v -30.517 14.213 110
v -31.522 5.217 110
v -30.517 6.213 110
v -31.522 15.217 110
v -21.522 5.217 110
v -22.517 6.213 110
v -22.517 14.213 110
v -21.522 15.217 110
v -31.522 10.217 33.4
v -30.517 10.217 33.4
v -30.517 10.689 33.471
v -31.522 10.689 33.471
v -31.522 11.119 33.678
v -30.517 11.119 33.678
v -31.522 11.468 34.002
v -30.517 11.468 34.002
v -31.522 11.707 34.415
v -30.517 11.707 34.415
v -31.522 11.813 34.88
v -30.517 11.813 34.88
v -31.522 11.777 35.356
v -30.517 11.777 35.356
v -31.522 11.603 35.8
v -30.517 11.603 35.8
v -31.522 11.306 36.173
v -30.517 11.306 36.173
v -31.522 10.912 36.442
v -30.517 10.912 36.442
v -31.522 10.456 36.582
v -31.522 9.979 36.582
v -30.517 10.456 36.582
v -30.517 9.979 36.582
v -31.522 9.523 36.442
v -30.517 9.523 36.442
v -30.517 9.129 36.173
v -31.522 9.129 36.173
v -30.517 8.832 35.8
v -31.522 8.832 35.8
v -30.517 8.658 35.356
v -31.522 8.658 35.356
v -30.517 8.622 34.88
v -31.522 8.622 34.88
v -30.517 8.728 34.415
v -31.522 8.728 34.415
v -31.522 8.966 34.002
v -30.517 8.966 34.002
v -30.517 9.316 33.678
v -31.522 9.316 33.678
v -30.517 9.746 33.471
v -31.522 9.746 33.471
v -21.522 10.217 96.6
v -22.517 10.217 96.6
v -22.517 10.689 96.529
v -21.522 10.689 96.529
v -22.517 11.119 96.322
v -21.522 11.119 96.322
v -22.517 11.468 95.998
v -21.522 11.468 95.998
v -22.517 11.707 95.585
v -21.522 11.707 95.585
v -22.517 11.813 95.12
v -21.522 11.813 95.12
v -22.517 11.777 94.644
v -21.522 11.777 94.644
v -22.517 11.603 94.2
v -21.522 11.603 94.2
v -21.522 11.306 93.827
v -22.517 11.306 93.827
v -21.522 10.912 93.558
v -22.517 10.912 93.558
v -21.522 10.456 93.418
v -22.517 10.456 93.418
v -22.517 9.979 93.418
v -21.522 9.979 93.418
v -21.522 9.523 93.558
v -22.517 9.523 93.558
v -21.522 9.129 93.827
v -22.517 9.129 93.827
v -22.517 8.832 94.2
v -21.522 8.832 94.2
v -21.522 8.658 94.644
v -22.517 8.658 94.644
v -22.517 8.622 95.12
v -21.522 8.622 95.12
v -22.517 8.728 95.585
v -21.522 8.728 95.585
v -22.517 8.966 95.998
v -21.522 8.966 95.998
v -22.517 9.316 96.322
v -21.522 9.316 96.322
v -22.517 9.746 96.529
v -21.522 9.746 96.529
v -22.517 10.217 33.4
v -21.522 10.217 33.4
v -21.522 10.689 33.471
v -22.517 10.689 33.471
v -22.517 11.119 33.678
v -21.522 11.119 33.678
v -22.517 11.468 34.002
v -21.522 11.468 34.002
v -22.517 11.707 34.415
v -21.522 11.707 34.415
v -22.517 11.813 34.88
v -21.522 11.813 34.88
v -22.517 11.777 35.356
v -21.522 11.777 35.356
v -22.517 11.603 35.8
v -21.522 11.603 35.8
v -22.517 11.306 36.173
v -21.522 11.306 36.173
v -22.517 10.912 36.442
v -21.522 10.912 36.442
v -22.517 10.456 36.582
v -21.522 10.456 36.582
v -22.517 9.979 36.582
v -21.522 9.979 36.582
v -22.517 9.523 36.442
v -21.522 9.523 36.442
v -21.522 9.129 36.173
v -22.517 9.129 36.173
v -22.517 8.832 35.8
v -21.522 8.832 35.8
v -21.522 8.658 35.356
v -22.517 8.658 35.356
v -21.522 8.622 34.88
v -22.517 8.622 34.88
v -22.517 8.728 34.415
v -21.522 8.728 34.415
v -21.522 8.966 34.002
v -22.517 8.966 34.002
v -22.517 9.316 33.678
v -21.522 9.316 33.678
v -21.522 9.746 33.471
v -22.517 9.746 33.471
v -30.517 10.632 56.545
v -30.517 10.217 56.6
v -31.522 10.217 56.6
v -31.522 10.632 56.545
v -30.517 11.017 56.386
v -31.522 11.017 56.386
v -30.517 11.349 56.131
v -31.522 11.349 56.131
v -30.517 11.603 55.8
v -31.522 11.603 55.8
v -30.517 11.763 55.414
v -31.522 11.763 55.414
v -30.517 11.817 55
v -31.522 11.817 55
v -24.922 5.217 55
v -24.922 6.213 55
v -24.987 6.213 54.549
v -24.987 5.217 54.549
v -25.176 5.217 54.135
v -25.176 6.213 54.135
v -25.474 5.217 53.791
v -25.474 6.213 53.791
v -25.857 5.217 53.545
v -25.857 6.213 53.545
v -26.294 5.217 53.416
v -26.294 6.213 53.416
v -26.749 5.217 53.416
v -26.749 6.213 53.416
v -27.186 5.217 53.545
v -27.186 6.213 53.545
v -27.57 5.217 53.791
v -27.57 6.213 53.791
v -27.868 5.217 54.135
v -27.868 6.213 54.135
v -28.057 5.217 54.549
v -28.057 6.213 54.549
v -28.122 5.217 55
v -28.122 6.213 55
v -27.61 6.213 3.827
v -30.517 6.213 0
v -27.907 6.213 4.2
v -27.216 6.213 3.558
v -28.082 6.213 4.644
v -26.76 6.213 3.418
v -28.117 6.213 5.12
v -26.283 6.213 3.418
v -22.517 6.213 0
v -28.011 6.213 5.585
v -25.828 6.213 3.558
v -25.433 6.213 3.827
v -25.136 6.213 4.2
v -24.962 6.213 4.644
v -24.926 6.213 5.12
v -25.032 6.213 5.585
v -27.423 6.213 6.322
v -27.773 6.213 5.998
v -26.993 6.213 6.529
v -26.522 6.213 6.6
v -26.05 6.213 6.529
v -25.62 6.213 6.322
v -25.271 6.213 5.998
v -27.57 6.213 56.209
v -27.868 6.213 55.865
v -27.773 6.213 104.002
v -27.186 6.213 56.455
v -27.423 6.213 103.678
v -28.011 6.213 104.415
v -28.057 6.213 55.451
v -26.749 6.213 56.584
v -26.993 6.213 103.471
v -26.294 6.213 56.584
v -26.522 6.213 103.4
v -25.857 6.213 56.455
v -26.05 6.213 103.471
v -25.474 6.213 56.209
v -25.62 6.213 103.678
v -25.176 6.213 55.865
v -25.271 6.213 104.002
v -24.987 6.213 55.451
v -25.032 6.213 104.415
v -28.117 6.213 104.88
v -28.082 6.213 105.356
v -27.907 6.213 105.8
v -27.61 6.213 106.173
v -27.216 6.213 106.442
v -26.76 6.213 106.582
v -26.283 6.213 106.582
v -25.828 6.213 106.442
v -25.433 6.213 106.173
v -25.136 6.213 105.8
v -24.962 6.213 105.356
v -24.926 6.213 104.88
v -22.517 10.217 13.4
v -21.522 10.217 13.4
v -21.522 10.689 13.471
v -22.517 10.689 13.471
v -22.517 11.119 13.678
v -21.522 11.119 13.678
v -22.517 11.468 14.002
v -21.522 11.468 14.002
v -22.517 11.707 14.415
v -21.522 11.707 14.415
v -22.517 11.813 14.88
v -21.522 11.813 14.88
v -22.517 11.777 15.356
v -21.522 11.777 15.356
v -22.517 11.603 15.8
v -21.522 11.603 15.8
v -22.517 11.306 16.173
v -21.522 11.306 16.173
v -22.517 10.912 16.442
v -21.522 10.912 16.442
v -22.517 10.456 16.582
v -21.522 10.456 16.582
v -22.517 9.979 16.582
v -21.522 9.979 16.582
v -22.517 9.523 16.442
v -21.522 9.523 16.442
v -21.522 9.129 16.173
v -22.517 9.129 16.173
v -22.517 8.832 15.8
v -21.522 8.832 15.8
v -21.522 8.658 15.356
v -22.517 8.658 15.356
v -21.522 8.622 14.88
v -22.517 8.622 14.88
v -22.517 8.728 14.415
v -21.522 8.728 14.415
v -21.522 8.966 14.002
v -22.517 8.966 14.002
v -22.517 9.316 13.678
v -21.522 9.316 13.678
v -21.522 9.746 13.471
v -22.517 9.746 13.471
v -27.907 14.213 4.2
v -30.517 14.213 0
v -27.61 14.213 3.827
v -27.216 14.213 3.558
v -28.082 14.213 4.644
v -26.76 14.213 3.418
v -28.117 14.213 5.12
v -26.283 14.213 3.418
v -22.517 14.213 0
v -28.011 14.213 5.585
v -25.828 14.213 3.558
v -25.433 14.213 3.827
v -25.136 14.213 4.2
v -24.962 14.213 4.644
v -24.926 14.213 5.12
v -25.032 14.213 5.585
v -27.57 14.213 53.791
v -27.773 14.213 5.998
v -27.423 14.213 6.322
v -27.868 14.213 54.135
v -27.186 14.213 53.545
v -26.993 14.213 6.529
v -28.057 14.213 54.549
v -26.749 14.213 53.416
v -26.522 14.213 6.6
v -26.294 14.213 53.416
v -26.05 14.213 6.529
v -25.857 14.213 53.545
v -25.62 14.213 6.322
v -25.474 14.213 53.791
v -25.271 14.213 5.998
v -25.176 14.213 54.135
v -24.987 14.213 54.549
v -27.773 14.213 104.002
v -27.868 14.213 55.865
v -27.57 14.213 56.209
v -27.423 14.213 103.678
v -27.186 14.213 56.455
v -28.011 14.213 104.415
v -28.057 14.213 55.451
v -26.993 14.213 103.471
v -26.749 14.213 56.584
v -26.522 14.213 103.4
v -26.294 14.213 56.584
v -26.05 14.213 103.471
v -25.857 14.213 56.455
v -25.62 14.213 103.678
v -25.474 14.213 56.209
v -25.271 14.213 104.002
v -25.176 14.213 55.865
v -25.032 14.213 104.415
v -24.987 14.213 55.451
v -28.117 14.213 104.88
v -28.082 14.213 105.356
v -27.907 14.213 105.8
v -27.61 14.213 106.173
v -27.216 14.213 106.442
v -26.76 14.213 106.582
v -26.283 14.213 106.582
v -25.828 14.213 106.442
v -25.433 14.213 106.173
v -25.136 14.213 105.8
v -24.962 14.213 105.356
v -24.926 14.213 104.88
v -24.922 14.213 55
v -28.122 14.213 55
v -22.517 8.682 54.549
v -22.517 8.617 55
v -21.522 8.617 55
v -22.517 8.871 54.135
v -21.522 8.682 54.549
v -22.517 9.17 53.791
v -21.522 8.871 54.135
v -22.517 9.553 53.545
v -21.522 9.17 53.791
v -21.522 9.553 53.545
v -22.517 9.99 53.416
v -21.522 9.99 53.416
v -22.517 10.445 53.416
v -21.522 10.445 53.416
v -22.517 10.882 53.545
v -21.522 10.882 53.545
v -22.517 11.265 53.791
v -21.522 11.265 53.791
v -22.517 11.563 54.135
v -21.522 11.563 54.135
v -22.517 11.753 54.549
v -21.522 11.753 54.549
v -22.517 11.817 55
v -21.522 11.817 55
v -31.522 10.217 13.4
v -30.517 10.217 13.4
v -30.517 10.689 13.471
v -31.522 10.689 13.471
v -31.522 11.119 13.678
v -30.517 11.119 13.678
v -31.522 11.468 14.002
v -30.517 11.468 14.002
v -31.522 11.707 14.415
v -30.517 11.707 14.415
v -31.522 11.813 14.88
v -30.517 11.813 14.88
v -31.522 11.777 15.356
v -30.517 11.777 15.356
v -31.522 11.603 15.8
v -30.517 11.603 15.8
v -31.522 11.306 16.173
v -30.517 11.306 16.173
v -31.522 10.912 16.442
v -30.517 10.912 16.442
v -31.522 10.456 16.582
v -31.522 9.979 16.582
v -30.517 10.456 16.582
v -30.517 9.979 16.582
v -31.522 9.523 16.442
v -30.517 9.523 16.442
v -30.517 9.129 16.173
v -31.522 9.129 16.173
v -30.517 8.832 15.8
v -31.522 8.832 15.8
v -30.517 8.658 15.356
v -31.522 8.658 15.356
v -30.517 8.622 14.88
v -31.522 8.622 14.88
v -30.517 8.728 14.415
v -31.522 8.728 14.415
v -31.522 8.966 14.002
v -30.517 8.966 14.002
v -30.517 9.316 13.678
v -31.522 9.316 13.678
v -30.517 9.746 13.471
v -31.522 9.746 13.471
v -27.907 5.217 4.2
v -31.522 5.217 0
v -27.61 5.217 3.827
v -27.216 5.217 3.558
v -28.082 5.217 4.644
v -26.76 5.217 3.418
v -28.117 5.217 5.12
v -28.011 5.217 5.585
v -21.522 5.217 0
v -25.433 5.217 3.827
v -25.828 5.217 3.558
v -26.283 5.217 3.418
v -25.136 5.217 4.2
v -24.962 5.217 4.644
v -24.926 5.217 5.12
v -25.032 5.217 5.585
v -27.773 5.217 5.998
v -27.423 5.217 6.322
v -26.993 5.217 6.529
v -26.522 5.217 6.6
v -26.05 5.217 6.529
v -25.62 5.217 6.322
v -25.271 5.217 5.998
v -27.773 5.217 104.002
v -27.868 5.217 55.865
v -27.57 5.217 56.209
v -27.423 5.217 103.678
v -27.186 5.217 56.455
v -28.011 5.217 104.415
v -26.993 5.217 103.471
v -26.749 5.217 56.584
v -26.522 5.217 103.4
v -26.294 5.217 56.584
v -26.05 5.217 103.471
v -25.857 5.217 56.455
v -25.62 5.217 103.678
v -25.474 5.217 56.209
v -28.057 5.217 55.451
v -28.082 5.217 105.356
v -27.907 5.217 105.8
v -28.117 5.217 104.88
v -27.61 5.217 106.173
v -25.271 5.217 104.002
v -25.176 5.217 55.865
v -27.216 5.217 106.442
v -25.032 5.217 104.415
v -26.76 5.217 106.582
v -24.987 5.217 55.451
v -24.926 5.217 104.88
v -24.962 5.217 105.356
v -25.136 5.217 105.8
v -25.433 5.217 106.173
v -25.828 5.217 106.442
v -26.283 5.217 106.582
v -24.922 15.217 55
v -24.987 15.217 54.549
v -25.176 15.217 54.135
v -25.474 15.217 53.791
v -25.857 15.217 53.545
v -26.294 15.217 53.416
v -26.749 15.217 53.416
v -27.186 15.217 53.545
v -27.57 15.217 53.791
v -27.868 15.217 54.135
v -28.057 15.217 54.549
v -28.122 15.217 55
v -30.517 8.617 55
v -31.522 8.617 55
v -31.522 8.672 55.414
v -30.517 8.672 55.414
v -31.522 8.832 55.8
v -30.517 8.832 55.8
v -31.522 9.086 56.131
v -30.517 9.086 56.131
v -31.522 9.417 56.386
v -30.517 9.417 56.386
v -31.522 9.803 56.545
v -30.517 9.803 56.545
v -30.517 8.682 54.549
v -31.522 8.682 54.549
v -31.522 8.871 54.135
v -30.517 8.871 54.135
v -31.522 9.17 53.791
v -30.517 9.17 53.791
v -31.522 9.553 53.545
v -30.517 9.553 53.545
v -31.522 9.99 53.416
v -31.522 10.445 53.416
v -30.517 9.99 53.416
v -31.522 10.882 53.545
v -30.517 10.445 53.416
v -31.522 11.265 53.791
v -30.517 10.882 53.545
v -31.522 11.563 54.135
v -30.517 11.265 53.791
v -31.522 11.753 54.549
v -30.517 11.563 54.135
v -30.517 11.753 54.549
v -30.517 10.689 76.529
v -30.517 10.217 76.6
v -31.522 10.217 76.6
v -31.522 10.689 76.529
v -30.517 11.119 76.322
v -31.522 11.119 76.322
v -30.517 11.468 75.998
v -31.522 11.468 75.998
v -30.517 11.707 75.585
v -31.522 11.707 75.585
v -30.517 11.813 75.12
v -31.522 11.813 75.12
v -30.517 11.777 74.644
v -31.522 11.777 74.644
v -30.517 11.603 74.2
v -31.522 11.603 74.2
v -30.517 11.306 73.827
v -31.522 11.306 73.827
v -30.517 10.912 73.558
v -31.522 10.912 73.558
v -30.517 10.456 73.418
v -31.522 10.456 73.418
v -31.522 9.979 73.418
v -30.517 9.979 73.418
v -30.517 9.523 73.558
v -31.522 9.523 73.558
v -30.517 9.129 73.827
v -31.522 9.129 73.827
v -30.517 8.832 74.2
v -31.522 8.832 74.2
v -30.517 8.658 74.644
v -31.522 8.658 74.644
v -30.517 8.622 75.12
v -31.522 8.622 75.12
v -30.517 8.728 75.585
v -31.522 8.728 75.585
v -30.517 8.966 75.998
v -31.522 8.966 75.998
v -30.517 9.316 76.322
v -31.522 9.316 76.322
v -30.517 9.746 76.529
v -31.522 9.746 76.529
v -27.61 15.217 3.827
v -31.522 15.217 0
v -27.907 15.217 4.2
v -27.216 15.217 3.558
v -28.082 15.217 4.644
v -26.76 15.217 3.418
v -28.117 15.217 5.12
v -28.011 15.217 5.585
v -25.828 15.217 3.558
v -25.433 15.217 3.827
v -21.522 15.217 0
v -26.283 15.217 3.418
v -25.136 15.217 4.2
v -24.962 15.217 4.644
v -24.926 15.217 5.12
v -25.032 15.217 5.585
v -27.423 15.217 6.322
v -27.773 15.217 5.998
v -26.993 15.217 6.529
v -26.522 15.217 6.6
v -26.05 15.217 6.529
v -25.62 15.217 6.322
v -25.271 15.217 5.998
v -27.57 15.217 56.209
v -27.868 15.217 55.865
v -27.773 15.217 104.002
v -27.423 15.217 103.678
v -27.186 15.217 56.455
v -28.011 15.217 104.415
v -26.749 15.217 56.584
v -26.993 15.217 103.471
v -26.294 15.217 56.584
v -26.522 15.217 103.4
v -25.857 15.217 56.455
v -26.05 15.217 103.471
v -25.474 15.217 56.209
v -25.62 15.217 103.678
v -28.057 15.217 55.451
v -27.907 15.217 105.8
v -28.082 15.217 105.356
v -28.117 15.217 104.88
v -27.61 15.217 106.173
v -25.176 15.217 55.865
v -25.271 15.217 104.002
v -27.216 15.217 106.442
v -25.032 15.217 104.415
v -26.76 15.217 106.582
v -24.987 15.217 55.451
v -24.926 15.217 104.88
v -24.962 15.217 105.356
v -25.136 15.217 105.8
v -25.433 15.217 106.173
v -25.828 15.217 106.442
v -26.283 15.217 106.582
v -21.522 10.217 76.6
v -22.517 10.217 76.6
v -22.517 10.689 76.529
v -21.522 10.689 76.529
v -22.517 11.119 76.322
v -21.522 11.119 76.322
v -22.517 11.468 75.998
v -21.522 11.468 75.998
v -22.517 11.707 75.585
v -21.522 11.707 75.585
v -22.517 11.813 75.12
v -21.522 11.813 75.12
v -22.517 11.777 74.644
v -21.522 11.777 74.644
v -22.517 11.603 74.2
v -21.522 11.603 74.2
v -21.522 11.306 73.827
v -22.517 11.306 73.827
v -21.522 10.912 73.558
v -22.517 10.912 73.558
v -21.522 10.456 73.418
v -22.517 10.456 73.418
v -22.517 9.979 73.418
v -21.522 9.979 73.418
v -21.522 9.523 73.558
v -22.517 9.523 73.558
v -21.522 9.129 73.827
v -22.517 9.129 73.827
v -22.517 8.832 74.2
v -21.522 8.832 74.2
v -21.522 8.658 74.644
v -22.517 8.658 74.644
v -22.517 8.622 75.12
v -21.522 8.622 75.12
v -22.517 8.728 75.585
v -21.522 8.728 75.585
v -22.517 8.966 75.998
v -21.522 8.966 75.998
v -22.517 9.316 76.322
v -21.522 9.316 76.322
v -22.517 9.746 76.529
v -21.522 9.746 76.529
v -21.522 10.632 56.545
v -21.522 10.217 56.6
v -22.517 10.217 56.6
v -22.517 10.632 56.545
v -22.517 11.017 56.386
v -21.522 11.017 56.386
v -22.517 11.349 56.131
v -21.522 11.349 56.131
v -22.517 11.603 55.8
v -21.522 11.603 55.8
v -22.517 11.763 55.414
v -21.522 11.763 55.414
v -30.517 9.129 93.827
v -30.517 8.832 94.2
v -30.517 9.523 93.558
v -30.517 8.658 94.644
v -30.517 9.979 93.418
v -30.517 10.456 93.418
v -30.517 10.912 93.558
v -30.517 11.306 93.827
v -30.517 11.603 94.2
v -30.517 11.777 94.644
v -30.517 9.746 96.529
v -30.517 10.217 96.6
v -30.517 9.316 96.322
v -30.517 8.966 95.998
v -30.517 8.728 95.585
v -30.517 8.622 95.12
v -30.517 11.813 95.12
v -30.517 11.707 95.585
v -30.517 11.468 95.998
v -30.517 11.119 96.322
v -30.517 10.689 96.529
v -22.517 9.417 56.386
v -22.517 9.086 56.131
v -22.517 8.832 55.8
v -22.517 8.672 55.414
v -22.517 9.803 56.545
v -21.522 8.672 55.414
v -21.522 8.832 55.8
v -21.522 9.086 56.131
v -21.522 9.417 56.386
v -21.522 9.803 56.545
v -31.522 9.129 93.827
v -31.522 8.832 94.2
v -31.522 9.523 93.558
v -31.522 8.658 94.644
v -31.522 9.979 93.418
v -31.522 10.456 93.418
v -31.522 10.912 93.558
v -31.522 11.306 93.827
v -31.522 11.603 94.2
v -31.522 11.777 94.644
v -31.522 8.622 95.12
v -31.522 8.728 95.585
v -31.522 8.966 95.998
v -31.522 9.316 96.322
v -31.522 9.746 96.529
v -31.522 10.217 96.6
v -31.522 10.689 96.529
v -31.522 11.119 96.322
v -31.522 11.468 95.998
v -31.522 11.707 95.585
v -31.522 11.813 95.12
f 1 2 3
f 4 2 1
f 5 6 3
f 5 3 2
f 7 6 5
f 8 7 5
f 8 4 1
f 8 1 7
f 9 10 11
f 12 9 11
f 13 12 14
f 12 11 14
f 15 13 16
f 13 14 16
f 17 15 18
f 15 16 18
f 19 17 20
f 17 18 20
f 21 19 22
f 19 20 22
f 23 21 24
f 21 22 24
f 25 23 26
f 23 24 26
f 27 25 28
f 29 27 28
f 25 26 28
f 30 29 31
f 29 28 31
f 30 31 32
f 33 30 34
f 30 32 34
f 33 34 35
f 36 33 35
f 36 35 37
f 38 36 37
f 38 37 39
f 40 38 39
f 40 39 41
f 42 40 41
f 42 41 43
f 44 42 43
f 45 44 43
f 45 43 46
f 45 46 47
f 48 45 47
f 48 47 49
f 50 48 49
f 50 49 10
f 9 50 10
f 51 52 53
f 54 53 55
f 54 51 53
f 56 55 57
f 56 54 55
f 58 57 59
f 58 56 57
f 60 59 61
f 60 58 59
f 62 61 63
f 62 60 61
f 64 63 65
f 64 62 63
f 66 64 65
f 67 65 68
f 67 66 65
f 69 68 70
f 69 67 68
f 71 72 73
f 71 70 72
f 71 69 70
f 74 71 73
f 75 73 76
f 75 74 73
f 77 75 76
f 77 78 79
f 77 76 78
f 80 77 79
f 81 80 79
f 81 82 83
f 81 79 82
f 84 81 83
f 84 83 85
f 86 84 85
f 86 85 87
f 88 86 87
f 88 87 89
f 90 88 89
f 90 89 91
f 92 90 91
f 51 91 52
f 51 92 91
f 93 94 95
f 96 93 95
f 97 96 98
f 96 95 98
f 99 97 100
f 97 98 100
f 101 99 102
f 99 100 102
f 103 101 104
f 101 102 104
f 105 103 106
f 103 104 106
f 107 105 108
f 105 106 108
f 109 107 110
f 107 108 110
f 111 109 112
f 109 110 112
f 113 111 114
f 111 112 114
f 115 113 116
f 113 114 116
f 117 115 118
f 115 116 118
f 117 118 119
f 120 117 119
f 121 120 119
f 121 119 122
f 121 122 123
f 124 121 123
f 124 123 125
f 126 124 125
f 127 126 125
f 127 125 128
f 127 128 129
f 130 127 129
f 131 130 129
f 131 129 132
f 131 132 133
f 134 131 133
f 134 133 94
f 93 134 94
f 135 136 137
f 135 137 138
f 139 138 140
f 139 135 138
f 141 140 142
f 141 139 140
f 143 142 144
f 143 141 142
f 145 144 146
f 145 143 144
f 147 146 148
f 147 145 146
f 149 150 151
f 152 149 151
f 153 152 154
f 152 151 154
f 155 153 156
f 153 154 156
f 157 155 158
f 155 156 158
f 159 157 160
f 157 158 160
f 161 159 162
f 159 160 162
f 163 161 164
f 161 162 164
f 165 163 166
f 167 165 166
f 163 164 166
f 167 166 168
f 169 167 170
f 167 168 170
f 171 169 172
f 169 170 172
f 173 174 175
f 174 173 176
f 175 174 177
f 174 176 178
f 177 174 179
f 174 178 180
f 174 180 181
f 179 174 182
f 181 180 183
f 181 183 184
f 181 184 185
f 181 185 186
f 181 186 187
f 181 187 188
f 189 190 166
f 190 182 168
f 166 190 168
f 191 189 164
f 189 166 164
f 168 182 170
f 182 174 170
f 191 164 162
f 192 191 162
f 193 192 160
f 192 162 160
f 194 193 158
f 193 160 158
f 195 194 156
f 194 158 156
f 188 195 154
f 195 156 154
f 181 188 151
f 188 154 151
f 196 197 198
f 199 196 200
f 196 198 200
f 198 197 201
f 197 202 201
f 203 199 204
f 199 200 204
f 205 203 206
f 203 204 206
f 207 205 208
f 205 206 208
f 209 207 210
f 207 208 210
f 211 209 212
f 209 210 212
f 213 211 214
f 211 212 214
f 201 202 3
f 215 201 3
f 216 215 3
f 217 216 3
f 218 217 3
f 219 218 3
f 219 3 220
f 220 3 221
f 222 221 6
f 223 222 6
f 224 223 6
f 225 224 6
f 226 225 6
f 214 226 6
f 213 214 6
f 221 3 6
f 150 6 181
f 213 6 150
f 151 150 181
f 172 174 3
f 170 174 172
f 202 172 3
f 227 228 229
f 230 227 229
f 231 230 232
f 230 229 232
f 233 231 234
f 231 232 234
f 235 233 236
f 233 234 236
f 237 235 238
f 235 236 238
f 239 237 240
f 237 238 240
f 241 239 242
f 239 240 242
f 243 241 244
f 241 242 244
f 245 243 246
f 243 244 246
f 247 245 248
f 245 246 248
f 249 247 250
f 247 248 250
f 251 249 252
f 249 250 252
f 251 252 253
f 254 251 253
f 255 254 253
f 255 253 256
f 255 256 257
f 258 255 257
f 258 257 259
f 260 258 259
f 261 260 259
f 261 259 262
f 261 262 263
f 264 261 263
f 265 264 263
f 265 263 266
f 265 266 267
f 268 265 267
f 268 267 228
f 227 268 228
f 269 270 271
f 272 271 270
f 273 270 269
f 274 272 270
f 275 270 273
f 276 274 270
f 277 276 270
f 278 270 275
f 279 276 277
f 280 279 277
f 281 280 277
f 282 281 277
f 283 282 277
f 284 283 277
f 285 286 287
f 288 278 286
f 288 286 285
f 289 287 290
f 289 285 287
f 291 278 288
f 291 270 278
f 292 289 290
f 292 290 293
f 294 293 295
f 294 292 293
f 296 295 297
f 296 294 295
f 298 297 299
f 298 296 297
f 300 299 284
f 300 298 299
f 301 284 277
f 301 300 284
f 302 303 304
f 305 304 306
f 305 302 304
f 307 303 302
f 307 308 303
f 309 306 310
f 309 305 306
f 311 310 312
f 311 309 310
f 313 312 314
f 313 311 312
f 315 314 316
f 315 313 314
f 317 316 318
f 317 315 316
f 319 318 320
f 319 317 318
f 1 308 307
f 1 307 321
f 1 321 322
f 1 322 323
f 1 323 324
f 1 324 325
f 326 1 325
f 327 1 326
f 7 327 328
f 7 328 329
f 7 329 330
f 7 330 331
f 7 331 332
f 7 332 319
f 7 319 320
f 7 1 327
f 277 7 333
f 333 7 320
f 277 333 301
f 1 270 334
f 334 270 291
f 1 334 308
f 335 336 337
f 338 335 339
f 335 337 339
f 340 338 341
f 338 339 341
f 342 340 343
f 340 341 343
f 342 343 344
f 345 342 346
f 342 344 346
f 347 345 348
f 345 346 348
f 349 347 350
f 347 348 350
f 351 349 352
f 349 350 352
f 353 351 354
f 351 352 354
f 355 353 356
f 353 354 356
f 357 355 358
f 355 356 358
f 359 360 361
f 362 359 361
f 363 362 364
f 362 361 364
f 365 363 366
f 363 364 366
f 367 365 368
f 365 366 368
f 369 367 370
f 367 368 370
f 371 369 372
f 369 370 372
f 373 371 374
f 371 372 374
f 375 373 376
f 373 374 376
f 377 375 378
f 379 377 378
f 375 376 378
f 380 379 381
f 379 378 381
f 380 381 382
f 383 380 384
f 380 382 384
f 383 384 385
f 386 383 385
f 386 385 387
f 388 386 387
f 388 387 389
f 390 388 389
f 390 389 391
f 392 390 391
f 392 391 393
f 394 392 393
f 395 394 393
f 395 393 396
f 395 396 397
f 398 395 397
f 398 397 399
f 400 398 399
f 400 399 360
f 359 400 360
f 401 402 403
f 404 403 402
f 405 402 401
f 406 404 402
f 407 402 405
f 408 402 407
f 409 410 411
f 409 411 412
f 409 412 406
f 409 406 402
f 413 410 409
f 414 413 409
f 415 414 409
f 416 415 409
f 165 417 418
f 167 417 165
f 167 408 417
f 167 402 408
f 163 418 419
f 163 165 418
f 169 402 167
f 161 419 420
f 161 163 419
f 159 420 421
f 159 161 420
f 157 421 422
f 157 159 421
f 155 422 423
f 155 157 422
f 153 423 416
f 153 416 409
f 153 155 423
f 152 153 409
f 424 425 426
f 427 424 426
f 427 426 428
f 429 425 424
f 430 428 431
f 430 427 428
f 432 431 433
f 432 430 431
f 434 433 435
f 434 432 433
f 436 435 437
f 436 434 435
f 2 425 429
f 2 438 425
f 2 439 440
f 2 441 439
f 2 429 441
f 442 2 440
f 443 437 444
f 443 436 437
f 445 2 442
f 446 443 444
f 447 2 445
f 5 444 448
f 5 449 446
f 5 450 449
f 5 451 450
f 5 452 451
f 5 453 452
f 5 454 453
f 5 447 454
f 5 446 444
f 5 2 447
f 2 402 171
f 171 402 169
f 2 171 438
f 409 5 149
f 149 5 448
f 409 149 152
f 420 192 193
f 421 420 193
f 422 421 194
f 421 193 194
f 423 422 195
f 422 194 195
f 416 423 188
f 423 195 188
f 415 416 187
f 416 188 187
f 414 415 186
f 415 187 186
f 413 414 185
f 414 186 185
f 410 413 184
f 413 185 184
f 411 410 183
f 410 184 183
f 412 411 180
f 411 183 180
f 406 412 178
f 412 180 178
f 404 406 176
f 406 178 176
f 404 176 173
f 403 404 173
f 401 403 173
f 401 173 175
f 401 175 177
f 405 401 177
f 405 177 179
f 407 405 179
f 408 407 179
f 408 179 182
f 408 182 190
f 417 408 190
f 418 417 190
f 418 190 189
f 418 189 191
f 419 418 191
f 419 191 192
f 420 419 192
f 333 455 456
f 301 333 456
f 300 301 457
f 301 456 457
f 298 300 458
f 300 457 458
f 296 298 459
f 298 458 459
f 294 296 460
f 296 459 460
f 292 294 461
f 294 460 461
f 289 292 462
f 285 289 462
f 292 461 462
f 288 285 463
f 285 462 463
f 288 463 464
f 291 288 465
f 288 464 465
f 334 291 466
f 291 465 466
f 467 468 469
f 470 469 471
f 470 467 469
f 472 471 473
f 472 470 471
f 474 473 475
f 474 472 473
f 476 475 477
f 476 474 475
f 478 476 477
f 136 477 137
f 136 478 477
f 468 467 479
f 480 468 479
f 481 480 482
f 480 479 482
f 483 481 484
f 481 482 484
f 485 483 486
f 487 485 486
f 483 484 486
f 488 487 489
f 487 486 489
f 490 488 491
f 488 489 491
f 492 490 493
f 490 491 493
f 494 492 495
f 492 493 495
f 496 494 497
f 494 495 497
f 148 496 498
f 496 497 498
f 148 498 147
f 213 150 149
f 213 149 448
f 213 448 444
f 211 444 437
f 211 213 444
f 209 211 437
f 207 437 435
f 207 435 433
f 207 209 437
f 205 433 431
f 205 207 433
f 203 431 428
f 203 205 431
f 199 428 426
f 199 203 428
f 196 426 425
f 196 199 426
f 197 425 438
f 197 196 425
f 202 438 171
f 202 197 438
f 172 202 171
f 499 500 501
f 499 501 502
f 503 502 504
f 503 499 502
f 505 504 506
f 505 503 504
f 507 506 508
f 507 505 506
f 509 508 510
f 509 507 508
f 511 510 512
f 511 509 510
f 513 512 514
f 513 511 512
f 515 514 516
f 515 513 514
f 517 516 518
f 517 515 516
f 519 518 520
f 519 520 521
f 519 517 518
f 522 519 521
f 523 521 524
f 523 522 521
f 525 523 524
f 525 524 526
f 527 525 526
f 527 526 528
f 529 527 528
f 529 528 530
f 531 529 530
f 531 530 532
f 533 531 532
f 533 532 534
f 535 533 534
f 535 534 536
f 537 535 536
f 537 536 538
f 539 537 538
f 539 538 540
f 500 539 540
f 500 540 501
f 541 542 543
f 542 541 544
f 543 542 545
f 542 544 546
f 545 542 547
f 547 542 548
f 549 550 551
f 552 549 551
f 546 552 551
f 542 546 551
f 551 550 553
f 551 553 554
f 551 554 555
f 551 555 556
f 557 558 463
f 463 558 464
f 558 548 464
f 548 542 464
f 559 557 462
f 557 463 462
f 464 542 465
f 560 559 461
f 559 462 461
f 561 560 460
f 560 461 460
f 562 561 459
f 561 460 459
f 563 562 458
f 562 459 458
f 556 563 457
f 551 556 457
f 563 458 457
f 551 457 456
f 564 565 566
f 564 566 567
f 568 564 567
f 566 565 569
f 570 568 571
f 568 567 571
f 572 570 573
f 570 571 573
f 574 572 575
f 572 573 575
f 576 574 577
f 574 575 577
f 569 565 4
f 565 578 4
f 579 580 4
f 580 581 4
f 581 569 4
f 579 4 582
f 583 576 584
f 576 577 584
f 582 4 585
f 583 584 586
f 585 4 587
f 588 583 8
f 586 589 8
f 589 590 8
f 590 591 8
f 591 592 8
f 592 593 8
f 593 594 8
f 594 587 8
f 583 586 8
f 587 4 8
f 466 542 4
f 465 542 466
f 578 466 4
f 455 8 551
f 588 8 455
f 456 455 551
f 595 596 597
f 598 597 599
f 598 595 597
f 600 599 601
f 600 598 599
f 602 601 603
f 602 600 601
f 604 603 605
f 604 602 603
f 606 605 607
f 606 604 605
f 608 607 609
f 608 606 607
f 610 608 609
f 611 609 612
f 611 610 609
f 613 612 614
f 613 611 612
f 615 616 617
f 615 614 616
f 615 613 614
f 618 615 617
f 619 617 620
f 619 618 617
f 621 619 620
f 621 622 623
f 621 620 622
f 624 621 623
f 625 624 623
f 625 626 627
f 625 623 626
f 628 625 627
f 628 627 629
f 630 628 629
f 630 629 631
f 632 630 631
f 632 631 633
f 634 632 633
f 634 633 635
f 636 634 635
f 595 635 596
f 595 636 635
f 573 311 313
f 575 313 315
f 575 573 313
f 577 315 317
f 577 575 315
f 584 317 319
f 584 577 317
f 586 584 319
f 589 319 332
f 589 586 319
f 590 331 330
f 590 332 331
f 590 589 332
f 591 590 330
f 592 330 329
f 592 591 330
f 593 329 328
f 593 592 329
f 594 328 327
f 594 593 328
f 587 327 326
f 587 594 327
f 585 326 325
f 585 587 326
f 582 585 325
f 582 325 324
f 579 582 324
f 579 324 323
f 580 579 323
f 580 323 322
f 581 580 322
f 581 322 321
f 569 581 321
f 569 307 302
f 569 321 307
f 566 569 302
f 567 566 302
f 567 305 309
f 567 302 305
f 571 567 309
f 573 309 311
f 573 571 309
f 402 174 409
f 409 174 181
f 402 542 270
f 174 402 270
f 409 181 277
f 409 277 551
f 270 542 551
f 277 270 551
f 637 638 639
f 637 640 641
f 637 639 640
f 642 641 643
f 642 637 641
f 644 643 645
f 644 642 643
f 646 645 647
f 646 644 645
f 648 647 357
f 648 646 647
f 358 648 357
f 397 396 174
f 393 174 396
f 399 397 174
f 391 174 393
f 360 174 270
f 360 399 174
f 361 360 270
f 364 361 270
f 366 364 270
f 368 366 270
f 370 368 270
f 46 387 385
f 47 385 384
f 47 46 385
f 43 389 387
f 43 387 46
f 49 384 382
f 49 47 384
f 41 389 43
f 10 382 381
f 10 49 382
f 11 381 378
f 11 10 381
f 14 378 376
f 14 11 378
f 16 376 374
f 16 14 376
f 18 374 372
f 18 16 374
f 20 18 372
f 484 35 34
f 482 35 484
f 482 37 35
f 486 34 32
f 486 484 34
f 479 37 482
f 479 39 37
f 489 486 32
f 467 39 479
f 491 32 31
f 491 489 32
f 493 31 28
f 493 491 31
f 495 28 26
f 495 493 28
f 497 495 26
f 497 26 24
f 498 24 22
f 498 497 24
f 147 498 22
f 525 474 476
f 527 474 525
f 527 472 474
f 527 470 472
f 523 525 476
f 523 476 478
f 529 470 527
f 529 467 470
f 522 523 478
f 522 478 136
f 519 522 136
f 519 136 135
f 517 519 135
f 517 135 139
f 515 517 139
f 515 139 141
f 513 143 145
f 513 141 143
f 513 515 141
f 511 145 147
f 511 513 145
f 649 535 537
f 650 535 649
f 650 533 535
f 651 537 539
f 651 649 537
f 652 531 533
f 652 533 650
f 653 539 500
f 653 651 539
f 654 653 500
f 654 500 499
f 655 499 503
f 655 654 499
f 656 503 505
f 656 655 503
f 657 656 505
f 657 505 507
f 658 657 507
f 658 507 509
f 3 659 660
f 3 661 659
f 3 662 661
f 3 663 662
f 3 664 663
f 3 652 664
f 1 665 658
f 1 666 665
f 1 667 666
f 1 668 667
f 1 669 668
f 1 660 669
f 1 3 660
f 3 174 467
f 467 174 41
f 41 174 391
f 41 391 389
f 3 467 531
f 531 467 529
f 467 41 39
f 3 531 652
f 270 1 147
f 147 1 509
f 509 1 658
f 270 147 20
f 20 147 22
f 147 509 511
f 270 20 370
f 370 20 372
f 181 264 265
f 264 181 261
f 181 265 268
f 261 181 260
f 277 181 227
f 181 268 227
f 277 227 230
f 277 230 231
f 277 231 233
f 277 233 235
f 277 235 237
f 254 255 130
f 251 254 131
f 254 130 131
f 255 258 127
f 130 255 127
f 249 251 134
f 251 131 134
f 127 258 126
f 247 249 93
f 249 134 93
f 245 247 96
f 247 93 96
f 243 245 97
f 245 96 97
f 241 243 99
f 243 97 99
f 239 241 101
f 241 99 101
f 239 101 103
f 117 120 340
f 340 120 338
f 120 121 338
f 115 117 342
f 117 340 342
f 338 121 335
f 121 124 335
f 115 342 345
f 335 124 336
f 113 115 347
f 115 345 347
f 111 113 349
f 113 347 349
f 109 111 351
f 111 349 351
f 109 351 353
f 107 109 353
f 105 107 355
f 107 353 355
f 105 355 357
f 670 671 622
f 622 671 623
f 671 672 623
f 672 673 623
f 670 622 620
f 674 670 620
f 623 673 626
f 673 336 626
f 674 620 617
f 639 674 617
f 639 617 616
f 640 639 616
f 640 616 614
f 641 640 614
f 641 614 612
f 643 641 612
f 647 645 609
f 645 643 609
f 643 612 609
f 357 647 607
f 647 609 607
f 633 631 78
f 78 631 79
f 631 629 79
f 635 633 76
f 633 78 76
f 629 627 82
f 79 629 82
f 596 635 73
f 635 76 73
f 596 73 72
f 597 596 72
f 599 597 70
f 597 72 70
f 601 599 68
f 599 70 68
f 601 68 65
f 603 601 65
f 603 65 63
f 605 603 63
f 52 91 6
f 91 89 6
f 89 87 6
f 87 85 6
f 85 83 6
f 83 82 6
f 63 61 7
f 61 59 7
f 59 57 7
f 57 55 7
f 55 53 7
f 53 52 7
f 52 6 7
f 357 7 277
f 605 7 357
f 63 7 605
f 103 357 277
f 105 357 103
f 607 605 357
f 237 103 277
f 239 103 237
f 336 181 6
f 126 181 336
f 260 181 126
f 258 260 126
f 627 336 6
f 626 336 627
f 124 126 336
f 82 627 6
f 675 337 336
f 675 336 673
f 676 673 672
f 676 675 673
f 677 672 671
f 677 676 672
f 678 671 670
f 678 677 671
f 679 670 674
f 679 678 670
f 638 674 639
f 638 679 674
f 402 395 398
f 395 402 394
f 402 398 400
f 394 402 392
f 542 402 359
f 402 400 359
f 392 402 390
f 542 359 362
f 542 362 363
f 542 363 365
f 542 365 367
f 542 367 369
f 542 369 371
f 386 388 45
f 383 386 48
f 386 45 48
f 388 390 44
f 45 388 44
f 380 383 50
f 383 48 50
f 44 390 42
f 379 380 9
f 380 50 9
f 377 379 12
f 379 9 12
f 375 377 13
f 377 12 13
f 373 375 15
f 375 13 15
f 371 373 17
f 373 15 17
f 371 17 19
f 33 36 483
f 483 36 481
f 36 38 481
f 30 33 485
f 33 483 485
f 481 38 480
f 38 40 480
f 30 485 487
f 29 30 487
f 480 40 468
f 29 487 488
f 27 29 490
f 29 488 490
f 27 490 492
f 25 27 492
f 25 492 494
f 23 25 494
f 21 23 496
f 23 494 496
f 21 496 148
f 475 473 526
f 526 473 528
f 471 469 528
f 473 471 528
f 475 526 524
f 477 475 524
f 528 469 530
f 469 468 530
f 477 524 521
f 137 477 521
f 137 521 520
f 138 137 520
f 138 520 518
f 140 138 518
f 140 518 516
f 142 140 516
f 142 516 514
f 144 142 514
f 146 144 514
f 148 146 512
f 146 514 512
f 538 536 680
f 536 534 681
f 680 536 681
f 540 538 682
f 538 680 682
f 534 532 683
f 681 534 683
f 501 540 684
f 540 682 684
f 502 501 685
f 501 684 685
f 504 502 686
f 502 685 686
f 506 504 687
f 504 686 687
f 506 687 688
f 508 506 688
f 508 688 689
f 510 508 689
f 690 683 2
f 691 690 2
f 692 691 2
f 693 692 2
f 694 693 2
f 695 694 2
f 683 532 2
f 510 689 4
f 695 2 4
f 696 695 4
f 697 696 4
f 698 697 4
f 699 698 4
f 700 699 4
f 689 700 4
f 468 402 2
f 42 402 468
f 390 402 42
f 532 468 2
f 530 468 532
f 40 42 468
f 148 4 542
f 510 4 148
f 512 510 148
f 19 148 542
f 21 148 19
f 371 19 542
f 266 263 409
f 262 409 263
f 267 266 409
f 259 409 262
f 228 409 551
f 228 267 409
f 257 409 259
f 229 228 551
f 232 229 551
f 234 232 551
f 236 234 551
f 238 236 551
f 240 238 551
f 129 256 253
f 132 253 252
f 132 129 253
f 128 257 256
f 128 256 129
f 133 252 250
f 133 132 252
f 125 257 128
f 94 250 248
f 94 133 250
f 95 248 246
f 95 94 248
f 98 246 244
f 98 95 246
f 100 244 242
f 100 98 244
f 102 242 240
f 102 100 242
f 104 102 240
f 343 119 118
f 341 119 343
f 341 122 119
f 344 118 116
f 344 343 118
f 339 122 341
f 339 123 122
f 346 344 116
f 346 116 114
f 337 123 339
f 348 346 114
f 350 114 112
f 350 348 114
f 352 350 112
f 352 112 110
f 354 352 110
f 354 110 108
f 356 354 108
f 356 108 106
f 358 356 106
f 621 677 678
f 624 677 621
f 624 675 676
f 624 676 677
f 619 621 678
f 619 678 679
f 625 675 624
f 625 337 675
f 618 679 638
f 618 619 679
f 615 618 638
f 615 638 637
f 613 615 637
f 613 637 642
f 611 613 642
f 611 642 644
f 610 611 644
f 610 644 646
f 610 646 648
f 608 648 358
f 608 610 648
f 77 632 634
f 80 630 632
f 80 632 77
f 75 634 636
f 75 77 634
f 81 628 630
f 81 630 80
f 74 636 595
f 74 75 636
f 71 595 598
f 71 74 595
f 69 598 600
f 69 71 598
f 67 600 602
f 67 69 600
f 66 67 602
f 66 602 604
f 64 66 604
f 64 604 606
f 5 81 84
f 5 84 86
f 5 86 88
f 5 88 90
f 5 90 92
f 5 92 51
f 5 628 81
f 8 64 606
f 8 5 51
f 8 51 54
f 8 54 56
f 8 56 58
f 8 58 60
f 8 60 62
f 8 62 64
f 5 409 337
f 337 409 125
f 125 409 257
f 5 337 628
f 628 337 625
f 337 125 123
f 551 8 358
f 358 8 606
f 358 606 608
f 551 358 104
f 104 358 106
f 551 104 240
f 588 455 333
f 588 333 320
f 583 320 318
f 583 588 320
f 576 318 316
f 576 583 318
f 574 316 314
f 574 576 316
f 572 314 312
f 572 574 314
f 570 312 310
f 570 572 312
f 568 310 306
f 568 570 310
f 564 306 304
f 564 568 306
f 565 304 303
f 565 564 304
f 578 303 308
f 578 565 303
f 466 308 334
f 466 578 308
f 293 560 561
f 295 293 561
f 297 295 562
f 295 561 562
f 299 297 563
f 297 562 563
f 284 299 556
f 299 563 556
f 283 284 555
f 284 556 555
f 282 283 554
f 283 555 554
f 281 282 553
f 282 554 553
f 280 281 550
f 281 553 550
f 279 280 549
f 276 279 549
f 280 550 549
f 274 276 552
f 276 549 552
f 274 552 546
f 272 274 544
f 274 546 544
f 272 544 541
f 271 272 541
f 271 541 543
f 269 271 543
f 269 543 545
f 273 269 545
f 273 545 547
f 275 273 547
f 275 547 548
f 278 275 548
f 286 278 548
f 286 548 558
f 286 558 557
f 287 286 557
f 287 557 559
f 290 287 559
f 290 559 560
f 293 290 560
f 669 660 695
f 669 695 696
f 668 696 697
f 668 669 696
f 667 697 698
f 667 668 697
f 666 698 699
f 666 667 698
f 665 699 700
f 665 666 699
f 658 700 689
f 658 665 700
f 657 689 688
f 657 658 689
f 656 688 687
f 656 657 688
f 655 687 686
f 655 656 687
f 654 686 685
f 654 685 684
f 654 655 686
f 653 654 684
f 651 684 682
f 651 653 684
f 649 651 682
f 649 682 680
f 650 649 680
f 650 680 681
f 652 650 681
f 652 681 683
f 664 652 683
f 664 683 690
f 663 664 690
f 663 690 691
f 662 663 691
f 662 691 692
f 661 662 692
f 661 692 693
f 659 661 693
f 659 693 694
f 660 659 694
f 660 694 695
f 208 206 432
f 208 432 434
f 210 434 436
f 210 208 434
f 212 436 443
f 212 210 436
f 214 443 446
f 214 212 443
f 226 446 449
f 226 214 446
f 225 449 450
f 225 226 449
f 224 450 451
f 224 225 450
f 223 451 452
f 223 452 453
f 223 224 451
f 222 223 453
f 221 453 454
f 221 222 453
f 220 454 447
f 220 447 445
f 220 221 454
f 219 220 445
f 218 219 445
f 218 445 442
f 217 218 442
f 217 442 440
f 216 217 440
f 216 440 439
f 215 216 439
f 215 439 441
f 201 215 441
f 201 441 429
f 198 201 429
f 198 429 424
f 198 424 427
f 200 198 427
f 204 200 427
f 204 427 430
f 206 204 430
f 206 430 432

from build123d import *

# Parameters (mm, degrees)
SKETCH1_W           = 10
SKETCH1_H           = 10
BOSS_EXTRUDE1_DEPTH = 55
SKETCH2_W           = 8
SKETCH2_H           = 8
CUT_EXTRUDE1_DEPTH  = 110
SKETCH4_R           = 1.6
CUT_EXTRUDE2_DEPTH  = 10
SKETCH3_R           = 1.6
CUT_EXTRUDE3_DEPTH  = 10


with BuildPart() as part:
    # Sketch1 → Boss-Extrude1 (new body)
    with BuildSketch(Plane.XY):
        with Locations((-26.52173913, 10.217391304)):
            Rectangle(SKETCH1_W, SKETCH1_H)
    boss_extrude1 = extrude(amount=BOSS_EXTRUDE1_DEPTH)

    # Sketch2 → Cut-Extrude1 (cut)
    with BuildSketch(Plane.XY.offset(55)):
        with Locations((-26.517415058, 10.213067232)):
            Rectangle(SKETCH2_W, SKETCH2_H)
    cut_extrude1 = extrude(amount=-CUT_EXTRUDE1_DEPTH, mode=Mode.SUBTRACT)

    # Sketch4 → Cut-Extrude2 (cut)
    with BuildSketch(Plane(origin=(-21.52173913, 0, 0), x_dir=(0, 0, -1), z_dir=(1, 0, 0))):
        with Locations((-15, 10.217391304)):
            Circle(SKETCH4_R)
        with Locations((-35, 10.217391304)):
            Circle(SKETCH4_R)
        with Locations((-55, 10.217391304)):
            Circle(SKETCH4_R)
    cut_extrude2 = extrude(amount=-CUT_EXTRUDE2_DEPTH, mode=Mode.SUBTRACT)

    # Sketch3 → Cut-Extrude3 (cut)
    with BuildSketch(Plane(origin=(0, 15.217391304, 0), x_dir=(1, 0, 0), z_dir=(0, 1, 0))):
        with BuildLine():
            Line((-28.12173913, -55), (-24.92173913, -55))
            ThreePointArc((-24.92173913, -55), (-26.52173913, -53.4), (-28.12173913, -55))
        make_face()
        with BuildLine():
            ThreePointArc((-28.12173913, -55), (-26.52173913, -56.6), (-24.92173913, -55))
            Line((-24.92173913, -55), (-28.12173913, -55))
        make_face()
        with Locations(Location((-26.52173913, -5, 0), (0, 0, 270))):
            Circle(SKETCH3_R)
    cut_extrude3 = extrude(amount=-CUT_EXTRUDE3_DEPTH, mode=Mode.SUBTRACT)

    # Mirror1: Boss-Extrude1, Cut-Extrude1, Cut-Extrude2, Cut-Extrude3 across plane
    add(boss_extrude1.mirror(Plane.XY.offset(55)))
    add(cut_extrude1.mirror(Plane.XY.offset(55)), mode=Mode.SUBTRACT)
    add(cut_extrude2.mirror(Plane.XY.offset(55)), mode=Mode.SUBTRACT)
    add(cut_extrude3.mirror(Plane.XY.offset(55)), mode=Mode.SUBTRACT)


solid = part.part
